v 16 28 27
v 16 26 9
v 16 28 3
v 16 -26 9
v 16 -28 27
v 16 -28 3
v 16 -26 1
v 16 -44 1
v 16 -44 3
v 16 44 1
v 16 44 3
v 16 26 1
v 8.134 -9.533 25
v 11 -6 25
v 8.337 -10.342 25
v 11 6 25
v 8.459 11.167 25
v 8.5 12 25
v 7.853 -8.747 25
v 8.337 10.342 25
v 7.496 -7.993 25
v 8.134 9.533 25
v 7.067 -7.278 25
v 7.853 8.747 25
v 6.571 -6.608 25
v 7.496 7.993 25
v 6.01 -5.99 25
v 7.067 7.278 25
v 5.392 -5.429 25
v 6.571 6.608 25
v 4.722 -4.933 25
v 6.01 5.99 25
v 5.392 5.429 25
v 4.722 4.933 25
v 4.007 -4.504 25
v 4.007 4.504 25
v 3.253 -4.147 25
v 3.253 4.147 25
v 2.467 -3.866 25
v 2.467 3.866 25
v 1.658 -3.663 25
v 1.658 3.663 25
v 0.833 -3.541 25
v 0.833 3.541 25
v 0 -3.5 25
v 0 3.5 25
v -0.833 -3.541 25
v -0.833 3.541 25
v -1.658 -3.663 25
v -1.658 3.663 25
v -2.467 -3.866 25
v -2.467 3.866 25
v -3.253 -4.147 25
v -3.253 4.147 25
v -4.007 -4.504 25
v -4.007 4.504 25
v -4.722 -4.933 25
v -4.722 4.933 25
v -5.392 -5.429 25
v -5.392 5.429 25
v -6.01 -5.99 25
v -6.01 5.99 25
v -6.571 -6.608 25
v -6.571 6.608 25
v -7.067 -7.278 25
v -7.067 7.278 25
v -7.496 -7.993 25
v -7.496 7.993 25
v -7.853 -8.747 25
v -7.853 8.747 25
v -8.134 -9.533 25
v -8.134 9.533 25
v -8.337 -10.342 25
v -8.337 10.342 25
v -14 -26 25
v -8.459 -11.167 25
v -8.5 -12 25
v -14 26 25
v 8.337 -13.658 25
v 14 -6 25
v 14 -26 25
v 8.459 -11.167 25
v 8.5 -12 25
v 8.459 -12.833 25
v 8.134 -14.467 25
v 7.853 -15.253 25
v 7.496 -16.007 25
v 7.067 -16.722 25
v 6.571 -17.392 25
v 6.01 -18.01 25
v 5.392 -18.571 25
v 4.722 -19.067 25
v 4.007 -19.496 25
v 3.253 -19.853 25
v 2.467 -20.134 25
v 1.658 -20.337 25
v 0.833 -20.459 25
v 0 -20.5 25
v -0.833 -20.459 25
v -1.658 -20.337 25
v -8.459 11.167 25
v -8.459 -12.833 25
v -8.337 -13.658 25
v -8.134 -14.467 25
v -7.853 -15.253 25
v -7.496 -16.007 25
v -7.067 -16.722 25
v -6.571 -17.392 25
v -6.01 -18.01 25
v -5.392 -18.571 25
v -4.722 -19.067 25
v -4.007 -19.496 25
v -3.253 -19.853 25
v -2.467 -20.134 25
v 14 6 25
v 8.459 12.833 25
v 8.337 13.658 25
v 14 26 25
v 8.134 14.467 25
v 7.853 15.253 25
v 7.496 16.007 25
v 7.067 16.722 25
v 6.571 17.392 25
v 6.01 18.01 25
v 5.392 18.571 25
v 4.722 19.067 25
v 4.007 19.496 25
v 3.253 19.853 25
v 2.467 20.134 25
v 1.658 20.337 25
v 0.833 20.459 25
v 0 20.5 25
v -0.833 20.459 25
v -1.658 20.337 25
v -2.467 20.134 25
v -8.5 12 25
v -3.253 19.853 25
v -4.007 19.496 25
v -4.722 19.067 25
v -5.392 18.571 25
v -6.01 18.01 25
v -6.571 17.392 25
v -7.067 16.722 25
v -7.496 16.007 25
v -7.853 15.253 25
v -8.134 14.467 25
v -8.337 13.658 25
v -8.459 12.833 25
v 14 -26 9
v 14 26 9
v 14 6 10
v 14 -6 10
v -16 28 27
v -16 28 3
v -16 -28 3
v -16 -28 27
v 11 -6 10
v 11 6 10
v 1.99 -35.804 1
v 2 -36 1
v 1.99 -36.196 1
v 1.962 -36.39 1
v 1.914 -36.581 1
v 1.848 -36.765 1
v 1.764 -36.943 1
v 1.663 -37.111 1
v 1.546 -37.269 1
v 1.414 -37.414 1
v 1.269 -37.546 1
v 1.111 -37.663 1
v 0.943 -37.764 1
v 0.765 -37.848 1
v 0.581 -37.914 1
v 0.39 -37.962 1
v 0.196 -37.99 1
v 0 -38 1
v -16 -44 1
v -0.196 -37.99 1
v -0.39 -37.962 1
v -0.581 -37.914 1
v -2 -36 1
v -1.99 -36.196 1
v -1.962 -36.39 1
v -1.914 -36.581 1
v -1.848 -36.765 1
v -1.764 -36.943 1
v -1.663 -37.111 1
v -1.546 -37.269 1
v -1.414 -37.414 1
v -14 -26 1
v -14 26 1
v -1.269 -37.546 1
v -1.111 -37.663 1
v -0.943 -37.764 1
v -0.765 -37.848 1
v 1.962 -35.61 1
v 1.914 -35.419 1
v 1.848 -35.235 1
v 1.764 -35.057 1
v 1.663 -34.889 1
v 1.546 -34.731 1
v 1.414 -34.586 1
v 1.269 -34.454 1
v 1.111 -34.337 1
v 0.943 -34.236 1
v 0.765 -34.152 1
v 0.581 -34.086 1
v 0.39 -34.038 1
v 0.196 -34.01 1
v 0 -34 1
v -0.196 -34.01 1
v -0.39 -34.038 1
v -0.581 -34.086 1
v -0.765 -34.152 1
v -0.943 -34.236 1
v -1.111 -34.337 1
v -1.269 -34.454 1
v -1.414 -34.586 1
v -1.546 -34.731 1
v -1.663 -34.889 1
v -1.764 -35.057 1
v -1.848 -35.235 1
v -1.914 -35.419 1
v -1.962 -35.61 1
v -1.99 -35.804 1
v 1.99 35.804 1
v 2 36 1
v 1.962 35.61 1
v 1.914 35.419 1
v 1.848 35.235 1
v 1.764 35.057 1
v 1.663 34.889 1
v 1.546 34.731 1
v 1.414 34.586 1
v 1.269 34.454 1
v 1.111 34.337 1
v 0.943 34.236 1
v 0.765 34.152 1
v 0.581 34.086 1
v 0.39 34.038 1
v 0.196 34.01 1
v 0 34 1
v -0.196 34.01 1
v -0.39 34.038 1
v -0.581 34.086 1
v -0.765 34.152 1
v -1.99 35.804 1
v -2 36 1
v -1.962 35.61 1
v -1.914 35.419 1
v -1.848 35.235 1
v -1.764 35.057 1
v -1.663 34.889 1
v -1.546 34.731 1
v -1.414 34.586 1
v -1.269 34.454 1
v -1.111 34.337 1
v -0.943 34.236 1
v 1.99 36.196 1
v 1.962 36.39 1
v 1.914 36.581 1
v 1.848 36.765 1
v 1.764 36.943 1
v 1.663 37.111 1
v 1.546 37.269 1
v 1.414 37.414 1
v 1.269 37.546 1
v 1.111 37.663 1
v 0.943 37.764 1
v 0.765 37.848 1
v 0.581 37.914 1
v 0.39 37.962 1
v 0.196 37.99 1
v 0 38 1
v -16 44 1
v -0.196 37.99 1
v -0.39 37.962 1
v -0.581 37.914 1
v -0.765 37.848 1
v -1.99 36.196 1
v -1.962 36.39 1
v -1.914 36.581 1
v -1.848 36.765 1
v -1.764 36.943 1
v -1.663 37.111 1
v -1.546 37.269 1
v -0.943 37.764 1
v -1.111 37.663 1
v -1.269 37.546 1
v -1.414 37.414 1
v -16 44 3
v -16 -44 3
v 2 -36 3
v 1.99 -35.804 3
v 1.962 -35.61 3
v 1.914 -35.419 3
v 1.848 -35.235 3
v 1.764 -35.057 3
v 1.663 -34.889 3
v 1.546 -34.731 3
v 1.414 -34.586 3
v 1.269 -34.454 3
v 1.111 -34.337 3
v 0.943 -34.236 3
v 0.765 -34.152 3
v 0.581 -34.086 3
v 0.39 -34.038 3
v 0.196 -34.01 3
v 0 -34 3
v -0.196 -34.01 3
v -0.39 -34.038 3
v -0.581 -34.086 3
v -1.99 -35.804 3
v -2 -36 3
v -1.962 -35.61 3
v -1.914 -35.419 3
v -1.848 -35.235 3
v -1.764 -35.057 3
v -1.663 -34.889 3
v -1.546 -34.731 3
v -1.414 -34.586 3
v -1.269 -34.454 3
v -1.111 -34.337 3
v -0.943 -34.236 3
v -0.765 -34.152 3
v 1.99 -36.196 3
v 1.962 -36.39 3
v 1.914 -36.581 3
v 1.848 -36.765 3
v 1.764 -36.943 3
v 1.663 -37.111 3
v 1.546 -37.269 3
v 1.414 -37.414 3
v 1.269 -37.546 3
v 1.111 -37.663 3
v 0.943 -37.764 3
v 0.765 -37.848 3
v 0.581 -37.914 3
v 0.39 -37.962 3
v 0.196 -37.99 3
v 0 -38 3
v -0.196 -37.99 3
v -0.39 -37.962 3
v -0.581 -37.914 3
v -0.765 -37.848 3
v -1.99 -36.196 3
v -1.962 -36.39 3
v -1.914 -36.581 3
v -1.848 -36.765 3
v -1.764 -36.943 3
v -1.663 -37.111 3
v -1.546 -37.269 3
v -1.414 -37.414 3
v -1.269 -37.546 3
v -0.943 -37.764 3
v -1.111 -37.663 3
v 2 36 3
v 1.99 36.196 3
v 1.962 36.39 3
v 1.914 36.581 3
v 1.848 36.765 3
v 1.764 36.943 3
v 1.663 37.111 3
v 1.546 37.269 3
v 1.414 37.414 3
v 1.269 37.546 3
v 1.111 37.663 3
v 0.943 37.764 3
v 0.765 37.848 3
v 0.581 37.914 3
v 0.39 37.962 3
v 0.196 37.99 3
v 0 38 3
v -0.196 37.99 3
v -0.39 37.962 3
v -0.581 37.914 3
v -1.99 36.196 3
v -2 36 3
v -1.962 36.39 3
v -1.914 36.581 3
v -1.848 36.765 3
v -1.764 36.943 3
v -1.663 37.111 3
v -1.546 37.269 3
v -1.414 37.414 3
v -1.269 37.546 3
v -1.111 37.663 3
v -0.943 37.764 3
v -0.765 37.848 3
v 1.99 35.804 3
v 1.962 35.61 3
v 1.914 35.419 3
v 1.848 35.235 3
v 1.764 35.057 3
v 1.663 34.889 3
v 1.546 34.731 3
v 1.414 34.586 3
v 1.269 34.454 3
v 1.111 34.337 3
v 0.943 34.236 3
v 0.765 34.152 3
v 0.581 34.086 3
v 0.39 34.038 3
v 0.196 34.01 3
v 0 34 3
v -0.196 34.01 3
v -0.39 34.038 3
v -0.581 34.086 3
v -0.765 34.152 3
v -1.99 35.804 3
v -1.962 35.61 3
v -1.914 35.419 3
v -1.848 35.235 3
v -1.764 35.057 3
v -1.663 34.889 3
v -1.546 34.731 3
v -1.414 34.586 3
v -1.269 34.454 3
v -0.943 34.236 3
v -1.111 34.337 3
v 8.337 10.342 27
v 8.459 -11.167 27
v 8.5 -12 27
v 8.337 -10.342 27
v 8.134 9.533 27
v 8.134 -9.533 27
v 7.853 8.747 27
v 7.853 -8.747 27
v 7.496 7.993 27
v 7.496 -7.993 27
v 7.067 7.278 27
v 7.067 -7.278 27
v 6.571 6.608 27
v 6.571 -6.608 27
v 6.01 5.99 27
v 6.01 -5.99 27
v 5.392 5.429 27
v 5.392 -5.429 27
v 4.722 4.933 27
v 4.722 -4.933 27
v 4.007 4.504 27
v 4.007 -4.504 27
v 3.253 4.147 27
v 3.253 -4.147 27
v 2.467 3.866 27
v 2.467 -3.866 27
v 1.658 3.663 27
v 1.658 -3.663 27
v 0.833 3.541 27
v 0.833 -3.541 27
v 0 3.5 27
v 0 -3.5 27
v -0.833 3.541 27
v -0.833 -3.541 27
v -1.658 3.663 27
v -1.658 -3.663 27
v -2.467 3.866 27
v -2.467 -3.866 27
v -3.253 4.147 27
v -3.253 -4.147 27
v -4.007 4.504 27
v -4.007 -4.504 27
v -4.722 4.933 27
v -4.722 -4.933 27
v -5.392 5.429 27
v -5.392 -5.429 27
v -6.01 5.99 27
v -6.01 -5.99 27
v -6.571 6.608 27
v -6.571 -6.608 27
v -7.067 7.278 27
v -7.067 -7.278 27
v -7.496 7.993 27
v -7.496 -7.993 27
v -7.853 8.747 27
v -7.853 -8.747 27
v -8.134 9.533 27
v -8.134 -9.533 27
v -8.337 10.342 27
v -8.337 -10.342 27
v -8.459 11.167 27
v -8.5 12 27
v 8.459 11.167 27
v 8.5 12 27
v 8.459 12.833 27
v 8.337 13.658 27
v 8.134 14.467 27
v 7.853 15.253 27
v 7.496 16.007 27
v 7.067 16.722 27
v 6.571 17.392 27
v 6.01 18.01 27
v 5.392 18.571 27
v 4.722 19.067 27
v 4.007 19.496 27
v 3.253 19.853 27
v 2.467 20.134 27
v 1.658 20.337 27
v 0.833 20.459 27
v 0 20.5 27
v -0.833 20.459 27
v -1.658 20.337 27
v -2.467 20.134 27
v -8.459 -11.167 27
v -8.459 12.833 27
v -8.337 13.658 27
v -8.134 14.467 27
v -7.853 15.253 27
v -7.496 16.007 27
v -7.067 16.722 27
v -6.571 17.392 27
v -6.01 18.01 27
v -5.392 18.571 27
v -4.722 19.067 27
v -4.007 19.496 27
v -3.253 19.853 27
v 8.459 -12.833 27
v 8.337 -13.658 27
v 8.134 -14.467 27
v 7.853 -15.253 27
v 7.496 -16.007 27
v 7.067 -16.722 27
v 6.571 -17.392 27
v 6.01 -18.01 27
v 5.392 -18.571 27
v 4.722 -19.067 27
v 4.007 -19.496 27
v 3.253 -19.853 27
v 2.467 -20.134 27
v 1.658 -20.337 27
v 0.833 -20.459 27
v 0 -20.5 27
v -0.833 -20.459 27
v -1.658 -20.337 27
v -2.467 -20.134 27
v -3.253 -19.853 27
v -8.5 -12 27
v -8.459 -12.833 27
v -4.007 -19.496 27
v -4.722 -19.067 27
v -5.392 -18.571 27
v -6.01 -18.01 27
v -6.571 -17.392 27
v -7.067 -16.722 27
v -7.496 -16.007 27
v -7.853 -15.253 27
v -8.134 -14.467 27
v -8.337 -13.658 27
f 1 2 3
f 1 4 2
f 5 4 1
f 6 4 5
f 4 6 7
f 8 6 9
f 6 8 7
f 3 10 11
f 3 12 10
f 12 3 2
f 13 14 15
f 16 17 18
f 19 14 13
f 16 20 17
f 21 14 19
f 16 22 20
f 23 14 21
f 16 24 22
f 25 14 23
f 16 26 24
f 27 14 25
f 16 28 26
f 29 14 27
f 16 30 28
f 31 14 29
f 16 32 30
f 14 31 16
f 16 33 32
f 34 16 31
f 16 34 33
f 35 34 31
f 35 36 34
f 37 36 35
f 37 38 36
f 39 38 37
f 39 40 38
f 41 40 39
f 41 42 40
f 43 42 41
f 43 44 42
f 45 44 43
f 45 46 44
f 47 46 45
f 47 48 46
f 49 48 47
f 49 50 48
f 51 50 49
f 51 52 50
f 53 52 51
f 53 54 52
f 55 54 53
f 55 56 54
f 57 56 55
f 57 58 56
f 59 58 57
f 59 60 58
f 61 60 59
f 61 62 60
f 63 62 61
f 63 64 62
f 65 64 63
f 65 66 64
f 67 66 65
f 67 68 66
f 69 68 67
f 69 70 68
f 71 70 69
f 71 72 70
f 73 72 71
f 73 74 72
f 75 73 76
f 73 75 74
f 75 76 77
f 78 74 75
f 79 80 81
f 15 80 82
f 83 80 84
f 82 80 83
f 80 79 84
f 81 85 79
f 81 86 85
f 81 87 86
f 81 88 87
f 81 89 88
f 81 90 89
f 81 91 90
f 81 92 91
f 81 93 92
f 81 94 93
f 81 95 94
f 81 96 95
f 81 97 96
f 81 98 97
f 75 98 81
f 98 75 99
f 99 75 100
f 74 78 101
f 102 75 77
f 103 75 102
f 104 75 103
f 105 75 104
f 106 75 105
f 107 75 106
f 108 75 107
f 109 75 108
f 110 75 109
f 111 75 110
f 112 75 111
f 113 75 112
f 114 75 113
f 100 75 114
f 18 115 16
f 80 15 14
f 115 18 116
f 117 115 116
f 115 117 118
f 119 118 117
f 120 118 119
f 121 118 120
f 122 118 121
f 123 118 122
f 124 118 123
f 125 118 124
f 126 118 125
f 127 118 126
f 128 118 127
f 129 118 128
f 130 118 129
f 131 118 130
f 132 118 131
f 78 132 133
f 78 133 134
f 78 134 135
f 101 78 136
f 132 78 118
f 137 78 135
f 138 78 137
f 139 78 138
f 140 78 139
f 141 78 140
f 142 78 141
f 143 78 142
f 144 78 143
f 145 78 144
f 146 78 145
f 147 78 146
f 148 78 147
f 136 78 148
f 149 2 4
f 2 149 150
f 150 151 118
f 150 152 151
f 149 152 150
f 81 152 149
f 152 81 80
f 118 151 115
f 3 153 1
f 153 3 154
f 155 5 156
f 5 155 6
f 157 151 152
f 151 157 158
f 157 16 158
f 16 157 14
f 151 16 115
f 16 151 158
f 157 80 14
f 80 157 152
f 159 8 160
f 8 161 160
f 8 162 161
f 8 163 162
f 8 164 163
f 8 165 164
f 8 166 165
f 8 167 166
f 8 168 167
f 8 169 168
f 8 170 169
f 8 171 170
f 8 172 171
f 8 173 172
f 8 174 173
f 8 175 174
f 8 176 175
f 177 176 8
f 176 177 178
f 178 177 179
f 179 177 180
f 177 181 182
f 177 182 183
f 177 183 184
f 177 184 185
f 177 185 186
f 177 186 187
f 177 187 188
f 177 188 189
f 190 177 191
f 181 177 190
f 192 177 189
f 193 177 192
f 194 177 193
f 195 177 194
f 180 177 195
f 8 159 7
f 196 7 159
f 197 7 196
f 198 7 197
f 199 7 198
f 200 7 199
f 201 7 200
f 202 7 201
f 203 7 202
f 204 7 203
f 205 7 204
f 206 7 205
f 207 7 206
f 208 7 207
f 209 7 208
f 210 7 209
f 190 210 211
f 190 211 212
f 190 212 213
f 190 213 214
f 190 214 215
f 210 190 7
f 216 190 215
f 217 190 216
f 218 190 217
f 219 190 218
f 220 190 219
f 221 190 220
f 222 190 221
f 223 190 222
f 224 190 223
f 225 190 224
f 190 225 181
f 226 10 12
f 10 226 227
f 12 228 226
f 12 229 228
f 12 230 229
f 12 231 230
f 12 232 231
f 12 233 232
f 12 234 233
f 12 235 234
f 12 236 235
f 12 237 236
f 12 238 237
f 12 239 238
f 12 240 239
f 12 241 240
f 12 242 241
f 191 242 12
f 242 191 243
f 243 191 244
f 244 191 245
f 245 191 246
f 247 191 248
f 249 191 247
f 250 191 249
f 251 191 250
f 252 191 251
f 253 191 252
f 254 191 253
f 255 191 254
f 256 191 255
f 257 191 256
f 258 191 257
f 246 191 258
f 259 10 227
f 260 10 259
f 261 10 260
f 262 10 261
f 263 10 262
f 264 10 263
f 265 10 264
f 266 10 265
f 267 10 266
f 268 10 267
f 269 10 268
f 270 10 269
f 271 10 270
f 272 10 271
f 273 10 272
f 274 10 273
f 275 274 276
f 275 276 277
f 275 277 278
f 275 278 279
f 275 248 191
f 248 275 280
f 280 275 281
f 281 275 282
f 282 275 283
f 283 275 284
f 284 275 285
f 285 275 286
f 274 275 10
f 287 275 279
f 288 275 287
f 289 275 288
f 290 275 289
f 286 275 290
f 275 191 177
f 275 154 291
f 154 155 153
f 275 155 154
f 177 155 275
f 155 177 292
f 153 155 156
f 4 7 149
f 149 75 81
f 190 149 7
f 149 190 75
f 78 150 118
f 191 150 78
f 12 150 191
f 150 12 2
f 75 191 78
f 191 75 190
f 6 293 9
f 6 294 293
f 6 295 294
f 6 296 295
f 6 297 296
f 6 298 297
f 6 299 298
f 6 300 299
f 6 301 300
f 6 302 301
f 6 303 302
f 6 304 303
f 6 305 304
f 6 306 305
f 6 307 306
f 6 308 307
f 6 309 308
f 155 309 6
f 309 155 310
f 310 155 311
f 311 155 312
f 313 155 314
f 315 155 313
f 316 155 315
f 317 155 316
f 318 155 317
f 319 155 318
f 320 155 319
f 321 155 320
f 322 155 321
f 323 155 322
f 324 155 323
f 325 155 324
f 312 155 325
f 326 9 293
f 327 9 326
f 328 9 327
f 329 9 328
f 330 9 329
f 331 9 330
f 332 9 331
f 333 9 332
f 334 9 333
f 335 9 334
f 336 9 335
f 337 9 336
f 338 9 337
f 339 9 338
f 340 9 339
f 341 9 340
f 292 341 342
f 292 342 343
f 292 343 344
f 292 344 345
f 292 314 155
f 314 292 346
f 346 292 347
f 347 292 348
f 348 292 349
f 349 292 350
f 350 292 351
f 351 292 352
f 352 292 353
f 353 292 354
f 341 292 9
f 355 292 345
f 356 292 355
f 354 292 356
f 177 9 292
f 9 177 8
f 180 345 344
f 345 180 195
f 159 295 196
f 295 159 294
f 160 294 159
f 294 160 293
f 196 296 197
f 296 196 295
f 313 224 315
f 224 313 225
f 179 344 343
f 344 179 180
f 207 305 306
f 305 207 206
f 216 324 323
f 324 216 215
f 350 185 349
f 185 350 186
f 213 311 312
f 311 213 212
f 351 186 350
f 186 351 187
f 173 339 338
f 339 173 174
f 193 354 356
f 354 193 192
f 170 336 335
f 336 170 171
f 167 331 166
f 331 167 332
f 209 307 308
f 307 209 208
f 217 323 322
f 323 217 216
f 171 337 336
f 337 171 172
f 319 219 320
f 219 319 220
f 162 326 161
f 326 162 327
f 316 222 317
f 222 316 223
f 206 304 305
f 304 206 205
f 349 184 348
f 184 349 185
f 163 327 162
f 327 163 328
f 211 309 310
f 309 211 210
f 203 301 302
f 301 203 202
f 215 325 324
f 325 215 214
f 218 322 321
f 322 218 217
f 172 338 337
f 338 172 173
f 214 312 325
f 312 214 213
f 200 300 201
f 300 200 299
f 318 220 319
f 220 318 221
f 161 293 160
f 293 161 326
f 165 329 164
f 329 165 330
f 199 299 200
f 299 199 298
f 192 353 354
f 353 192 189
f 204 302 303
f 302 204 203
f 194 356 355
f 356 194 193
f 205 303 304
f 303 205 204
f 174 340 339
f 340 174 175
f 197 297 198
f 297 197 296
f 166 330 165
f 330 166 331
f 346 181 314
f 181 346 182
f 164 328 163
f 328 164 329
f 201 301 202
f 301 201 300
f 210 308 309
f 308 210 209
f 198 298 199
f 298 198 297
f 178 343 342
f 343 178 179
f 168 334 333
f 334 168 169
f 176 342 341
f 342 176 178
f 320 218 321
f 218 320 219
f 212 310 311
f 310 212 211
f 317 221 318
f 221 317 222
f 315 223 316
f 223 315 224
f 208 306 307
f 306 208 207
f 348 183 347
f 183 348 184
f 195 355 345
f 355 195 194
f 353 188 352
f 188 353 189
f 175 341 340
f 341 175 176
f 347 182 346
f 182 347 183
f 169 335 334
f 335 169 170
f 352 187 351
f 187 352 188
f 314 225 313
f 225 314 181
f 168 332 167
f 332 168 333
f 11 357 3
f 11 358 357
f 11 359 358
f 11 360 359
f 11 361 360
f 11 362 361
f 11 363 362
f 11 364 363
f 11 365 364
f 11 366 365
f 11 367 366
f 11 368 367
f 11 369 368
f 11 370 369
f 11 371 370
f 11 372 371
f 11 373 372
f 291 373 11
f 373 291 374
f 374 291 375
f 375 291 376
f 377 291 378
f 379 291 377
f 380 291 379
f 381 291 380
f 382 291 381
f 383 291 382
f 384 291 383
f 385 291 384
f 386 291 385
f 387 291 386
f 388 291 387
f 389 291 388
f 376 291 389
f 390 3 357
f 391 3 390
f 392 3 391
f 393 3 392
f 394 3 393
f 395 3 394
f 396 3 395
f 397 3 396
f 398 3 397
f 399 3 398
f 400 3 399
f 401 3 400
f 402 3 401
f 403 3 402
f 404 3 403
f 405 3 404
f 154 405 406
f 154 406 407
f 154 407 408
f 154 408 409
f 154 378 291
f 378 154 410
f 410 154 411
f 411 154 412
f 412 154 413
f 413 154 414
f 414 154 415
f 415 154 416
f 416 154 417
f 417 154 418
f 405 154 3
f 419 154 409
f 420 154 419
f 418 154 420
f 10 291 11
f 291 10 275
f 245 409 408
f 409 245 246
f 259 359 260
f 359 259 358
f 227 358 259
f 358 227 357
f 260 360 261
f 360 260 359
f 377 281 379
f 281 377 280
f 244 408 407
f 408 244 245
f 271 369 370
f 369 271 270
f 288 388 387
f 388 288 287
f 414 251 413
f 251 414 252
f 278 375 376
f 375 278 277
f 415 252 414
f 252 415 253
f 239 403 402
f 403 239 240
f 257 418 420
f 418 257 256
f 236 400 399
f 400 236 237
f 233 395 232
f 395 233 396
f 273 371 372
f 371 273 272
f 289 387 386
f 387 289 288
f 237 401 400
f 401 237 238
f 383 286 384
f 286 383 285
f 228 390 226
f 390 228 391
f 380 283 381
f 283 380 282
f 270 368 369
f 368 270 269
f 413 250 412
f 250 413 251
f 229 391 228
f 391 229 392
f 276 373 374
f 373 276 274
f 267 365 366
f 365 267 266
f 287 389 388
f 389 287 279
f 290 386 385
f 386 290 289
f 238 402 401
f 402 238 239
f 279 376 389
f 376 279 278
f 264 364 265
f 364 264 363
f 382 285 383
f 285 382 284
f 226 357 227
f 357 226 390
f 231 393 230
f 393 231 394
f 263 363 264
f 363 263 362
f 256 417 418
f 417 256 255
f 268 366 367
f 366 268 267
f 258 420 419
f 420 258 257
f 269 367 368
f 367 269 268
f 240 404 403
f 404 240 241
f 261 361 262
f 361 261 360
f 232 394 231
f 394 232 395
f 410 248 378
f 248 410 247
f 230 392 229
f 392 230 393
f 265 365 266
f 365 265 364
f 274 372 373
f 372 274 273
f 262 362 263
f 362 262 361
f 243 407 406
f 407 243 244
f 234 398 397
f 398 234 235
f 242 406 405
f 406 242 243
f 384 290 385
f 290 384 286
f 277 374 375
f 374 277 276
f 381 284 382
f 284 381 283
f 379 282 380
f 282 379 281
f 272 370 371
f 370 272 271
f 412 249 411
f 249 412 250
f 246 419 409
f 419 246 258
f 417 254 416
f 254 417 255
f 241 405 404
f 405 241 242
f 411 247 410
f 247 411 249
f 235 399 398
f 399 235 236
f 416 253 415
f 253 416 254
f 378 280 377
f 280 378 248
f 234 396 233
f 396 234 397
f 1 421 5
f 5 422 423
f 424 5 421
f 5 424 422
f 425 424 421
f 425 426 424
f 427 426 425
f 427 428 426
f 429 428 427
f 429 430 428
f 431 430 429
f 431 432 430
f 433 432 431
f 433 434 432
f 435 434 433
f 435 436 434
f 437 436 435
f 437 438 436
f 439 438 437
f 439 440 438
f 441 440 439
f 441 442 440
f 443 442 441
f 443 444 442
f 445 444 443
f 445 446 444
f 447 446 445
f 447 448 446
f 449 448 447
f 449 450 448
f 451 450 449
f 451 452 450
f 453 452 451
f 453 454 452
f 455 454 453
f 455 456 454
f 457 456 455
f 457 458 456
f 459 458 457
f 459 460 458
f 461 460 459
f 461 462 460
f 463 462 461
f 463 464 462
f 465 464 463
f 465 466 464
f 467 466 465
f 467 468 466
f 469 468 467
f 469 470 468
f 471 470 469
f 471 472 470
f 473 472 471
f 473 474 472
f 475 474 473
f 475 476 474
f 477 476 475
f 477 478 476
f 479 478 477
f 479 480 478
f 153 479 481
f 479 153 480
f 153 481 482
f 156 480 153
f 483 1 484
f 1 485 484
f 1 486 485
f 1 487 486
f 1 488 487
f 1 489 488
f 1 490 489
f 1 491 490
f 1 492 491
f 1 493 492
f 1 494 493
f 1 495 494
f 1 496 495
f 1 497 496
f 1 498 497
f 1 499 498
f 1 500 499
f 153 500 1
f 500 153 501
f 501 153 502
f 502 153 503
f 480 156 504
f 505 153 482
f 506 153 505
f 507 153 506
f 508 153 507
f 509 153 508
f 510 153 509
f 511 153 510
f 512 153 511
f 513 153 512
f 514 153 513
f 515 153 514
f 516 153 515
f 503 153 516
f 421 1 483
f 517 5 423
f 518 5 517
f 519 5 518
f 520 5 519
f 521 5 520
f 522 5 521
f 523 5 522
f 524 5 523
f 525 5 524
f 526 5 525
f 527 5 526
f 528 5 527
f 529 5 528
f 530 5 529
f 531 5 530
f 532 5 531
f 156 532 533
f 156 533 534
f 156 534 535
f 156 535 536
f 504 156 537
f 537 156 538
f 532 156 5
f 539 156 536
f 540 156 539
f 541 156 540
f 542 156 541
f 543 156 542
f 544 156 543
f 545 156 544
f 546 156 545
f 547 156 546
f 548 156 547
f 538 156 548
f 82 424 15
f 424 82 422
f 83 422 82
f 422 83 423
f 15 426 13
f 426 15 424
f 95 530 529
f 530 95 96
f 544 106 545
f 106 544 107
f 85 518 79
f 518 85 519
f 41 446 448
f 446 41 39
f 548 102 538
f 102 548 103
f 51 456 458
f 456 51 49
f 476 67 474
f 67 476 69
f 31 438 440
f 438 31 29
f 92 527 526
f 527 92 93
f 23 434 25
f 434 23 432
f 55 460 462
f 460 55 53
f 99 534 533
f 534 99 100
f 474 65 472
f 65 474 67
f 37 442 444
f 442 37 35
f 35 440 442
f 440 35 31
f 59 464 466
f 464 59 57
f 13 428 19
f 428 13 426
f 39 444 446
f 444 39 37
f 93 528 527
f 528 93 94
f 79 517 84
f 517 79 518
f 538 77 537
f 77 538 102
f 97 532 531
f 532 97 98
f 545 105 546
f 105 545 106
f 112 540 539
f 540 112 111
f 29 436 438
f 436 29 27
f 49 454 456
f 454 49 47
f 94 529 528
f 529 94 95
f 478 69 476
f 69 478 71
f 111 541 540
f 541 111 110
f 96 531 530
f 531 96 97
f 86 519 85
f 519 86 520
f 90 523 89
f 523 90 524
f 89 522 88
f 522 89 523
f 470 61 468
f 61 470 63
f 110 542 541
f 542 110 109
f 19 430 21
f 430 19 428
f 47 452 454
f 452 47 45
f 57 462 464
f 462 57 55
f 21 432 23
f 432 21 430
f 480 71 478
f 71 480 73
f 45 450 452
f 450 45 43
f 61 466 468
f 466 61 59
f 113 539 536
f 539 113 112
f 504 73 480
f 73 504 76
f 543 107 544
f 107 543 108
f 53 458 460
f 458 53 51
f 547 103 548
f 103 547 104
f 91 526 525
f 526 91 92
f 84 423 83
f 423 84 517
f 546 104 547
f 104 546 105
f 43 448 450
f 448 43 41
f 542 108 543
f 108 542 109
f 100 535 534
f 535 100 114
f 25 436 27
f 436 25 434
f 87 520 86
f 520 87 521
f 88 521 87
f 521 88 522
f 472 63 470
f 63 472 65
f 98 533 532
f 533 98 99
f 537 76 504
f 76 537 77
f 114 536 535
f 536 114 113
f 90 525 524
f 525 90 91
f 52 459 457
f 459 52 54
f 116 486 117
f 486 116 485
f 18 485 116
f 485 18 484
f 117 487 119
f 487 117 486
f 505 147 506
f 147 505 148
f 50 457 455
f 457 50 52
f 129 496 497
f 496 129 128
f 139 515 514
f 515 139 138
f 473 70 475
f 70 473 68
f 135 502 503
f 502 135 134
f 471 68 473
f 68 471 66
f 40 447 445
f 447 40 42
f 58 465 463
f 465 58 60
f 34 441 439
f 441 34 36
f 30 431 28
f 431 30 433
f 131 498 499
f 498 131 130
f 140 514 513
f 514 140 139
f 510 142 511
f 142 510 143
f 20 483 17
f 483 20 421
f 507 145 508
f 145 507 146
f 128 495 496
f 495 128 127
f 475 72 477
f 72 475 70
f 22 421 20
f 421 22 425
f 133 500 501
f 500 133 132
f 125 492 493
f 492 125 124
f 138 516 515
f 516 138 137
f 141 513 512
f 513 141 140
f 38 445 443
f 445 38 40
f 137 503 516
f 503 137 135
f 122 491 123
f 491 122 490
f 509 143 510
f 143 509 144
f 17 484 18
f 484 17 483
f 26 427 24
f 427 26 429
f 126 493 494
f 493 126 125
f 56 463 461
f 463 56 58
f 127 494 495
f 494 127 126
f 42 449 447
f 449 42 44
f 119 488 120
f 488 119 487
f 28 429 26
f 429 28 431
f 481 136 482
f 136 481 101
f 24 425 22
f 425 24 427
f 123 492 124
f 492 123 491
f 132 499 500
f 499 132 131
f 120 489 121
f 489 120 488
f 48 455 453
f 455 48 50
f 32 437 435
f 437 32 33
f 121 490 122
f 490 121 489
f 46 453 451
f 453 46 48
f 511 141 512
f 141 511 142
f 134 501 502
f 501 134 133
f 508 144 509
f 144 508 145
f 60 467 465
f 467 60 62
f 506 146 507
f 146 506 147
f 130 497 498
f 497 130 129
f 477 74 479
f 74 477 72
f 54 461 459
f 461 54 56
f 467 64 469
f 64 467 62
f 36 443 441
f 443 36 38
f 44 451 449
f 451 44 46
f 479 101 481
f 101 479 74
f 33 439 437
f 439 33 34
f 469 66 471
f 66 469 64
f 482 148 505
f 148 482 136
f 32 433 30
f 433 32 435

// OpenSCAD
internal_length = 46;
internal_width = 22;
internal_height = 16;

/*
length = 51;
width  = 25;
height = 20;
*/
thickness = 2;

step_down       = 6;
cut_length      = 14;
step_down_depth = 9.5;


length = internal_length + 2*thickness;
width = internal_width + 2*thickness;
height = internal_height + thickness + step_down;

gap = 1;

base = false;
shell = true;
if(base){
    difference(){
        translate([-(width/2), -(length/2), 0]){
            cube([width, length, height]);
        }
        union(){
            translate([-(internal_width/2), -(internal_length/2), thickness + step_down]){
                cube([internal_width,internal_length, height + 5]);
            }
            translate([width/2 - step_down_depth,-(cut_length/2),thickness]){
                cube([10, cut_length,height + step_down]);
            }
        }
    }
}

if(shell){
    shell_width = width + 2*(thickness + gap);
    shell_length = length + 2*(thickness + gap);
    shell_height = height + gap + thickness;
    
    lense_true_radius = 8; 
    lense_far_y_offset = 19;
    lense_inner_y_offset = lense_far_y_offset - (2*lense_true_radius);
    
    lense_far_x_offset = 19;
    lense_inner_x_offset = lense_far_x_offset - (2*lense_true_radius); /* = 9 */
    
    lense_hole_radius = lense_true_radius + 0.5;
    lense_hole_y_offset = lense_inner_y_offset - 0.5;
    lense_hole_x_offset = lense_inner_x_offset - 0.5;
    
    shell_wing_length = 16;
    screw_hole_radius = 2;
    
    difference(){
        translate([-shell_width/2, -shell_length/2, shell_height -thickness]){    
            cube([shell_width, shell_length, thickness]);
            translate([0,0,-height]){        
                cube([shell_width, thickness, height]);
                translate([0,shell_length - thickness,0]){
                    cube([shell_width,thickness,height]);
                }
                cube([thickness, shell_length, height]);
                translate([shell_width - thickness, 0, (thickness + step_down)]){
                    cube([thickness, shell_length, height - (thickness + step_down)]);
                    translate([-(thickness + gap), (shell_length - cut_length)/2 + gap, gap]){
                        cube([thickness + gap, cut_length - (2*gap), height - (thickness + step_down + gap)]);
                    }
                }
        
            }
            translate([0,-shell_wing_length, -height]){
                difference(){
                    cube([shell_width, shell_wing_length, thickness]);
                    translate([shell_width/2, shell_wing_length/2, -1]){
                        cylinder(r = screw_hole_radius, h = thickness + 2, $fn=64);
                    }
                }
            }
            translate([0,shell_length, -height]){
                difference(){
                    cube([shell_width, shell_wing_length, thickness]);
                    translate([shell_width/2, shell_wing_length/2, -1]){
                        cylinder(r = screw_hole_radius, h = thickness + 2, $fn=64);
                    }
                }
            }
        }
        union(){
            translate([ (internal_width/2) - (lense_hole_x_offset + lense_hole_radius),
                        -(internal_length/2) + lense_hole_radius + lense_hole_y_offset, height]){
                cylinder(r=lense_hole_radius, h=10, $fn=64);
            }
            translate([(internal_width/2) - (lense_hole_x_offset + lense_hole_radius),
                        internal_length/2 - (lense_hole_radius + lense_hole_y_offset), height]){
                cylinder(r=lense_hole_radius, h=10, $fn=64);
            }
        }
    }
    }
